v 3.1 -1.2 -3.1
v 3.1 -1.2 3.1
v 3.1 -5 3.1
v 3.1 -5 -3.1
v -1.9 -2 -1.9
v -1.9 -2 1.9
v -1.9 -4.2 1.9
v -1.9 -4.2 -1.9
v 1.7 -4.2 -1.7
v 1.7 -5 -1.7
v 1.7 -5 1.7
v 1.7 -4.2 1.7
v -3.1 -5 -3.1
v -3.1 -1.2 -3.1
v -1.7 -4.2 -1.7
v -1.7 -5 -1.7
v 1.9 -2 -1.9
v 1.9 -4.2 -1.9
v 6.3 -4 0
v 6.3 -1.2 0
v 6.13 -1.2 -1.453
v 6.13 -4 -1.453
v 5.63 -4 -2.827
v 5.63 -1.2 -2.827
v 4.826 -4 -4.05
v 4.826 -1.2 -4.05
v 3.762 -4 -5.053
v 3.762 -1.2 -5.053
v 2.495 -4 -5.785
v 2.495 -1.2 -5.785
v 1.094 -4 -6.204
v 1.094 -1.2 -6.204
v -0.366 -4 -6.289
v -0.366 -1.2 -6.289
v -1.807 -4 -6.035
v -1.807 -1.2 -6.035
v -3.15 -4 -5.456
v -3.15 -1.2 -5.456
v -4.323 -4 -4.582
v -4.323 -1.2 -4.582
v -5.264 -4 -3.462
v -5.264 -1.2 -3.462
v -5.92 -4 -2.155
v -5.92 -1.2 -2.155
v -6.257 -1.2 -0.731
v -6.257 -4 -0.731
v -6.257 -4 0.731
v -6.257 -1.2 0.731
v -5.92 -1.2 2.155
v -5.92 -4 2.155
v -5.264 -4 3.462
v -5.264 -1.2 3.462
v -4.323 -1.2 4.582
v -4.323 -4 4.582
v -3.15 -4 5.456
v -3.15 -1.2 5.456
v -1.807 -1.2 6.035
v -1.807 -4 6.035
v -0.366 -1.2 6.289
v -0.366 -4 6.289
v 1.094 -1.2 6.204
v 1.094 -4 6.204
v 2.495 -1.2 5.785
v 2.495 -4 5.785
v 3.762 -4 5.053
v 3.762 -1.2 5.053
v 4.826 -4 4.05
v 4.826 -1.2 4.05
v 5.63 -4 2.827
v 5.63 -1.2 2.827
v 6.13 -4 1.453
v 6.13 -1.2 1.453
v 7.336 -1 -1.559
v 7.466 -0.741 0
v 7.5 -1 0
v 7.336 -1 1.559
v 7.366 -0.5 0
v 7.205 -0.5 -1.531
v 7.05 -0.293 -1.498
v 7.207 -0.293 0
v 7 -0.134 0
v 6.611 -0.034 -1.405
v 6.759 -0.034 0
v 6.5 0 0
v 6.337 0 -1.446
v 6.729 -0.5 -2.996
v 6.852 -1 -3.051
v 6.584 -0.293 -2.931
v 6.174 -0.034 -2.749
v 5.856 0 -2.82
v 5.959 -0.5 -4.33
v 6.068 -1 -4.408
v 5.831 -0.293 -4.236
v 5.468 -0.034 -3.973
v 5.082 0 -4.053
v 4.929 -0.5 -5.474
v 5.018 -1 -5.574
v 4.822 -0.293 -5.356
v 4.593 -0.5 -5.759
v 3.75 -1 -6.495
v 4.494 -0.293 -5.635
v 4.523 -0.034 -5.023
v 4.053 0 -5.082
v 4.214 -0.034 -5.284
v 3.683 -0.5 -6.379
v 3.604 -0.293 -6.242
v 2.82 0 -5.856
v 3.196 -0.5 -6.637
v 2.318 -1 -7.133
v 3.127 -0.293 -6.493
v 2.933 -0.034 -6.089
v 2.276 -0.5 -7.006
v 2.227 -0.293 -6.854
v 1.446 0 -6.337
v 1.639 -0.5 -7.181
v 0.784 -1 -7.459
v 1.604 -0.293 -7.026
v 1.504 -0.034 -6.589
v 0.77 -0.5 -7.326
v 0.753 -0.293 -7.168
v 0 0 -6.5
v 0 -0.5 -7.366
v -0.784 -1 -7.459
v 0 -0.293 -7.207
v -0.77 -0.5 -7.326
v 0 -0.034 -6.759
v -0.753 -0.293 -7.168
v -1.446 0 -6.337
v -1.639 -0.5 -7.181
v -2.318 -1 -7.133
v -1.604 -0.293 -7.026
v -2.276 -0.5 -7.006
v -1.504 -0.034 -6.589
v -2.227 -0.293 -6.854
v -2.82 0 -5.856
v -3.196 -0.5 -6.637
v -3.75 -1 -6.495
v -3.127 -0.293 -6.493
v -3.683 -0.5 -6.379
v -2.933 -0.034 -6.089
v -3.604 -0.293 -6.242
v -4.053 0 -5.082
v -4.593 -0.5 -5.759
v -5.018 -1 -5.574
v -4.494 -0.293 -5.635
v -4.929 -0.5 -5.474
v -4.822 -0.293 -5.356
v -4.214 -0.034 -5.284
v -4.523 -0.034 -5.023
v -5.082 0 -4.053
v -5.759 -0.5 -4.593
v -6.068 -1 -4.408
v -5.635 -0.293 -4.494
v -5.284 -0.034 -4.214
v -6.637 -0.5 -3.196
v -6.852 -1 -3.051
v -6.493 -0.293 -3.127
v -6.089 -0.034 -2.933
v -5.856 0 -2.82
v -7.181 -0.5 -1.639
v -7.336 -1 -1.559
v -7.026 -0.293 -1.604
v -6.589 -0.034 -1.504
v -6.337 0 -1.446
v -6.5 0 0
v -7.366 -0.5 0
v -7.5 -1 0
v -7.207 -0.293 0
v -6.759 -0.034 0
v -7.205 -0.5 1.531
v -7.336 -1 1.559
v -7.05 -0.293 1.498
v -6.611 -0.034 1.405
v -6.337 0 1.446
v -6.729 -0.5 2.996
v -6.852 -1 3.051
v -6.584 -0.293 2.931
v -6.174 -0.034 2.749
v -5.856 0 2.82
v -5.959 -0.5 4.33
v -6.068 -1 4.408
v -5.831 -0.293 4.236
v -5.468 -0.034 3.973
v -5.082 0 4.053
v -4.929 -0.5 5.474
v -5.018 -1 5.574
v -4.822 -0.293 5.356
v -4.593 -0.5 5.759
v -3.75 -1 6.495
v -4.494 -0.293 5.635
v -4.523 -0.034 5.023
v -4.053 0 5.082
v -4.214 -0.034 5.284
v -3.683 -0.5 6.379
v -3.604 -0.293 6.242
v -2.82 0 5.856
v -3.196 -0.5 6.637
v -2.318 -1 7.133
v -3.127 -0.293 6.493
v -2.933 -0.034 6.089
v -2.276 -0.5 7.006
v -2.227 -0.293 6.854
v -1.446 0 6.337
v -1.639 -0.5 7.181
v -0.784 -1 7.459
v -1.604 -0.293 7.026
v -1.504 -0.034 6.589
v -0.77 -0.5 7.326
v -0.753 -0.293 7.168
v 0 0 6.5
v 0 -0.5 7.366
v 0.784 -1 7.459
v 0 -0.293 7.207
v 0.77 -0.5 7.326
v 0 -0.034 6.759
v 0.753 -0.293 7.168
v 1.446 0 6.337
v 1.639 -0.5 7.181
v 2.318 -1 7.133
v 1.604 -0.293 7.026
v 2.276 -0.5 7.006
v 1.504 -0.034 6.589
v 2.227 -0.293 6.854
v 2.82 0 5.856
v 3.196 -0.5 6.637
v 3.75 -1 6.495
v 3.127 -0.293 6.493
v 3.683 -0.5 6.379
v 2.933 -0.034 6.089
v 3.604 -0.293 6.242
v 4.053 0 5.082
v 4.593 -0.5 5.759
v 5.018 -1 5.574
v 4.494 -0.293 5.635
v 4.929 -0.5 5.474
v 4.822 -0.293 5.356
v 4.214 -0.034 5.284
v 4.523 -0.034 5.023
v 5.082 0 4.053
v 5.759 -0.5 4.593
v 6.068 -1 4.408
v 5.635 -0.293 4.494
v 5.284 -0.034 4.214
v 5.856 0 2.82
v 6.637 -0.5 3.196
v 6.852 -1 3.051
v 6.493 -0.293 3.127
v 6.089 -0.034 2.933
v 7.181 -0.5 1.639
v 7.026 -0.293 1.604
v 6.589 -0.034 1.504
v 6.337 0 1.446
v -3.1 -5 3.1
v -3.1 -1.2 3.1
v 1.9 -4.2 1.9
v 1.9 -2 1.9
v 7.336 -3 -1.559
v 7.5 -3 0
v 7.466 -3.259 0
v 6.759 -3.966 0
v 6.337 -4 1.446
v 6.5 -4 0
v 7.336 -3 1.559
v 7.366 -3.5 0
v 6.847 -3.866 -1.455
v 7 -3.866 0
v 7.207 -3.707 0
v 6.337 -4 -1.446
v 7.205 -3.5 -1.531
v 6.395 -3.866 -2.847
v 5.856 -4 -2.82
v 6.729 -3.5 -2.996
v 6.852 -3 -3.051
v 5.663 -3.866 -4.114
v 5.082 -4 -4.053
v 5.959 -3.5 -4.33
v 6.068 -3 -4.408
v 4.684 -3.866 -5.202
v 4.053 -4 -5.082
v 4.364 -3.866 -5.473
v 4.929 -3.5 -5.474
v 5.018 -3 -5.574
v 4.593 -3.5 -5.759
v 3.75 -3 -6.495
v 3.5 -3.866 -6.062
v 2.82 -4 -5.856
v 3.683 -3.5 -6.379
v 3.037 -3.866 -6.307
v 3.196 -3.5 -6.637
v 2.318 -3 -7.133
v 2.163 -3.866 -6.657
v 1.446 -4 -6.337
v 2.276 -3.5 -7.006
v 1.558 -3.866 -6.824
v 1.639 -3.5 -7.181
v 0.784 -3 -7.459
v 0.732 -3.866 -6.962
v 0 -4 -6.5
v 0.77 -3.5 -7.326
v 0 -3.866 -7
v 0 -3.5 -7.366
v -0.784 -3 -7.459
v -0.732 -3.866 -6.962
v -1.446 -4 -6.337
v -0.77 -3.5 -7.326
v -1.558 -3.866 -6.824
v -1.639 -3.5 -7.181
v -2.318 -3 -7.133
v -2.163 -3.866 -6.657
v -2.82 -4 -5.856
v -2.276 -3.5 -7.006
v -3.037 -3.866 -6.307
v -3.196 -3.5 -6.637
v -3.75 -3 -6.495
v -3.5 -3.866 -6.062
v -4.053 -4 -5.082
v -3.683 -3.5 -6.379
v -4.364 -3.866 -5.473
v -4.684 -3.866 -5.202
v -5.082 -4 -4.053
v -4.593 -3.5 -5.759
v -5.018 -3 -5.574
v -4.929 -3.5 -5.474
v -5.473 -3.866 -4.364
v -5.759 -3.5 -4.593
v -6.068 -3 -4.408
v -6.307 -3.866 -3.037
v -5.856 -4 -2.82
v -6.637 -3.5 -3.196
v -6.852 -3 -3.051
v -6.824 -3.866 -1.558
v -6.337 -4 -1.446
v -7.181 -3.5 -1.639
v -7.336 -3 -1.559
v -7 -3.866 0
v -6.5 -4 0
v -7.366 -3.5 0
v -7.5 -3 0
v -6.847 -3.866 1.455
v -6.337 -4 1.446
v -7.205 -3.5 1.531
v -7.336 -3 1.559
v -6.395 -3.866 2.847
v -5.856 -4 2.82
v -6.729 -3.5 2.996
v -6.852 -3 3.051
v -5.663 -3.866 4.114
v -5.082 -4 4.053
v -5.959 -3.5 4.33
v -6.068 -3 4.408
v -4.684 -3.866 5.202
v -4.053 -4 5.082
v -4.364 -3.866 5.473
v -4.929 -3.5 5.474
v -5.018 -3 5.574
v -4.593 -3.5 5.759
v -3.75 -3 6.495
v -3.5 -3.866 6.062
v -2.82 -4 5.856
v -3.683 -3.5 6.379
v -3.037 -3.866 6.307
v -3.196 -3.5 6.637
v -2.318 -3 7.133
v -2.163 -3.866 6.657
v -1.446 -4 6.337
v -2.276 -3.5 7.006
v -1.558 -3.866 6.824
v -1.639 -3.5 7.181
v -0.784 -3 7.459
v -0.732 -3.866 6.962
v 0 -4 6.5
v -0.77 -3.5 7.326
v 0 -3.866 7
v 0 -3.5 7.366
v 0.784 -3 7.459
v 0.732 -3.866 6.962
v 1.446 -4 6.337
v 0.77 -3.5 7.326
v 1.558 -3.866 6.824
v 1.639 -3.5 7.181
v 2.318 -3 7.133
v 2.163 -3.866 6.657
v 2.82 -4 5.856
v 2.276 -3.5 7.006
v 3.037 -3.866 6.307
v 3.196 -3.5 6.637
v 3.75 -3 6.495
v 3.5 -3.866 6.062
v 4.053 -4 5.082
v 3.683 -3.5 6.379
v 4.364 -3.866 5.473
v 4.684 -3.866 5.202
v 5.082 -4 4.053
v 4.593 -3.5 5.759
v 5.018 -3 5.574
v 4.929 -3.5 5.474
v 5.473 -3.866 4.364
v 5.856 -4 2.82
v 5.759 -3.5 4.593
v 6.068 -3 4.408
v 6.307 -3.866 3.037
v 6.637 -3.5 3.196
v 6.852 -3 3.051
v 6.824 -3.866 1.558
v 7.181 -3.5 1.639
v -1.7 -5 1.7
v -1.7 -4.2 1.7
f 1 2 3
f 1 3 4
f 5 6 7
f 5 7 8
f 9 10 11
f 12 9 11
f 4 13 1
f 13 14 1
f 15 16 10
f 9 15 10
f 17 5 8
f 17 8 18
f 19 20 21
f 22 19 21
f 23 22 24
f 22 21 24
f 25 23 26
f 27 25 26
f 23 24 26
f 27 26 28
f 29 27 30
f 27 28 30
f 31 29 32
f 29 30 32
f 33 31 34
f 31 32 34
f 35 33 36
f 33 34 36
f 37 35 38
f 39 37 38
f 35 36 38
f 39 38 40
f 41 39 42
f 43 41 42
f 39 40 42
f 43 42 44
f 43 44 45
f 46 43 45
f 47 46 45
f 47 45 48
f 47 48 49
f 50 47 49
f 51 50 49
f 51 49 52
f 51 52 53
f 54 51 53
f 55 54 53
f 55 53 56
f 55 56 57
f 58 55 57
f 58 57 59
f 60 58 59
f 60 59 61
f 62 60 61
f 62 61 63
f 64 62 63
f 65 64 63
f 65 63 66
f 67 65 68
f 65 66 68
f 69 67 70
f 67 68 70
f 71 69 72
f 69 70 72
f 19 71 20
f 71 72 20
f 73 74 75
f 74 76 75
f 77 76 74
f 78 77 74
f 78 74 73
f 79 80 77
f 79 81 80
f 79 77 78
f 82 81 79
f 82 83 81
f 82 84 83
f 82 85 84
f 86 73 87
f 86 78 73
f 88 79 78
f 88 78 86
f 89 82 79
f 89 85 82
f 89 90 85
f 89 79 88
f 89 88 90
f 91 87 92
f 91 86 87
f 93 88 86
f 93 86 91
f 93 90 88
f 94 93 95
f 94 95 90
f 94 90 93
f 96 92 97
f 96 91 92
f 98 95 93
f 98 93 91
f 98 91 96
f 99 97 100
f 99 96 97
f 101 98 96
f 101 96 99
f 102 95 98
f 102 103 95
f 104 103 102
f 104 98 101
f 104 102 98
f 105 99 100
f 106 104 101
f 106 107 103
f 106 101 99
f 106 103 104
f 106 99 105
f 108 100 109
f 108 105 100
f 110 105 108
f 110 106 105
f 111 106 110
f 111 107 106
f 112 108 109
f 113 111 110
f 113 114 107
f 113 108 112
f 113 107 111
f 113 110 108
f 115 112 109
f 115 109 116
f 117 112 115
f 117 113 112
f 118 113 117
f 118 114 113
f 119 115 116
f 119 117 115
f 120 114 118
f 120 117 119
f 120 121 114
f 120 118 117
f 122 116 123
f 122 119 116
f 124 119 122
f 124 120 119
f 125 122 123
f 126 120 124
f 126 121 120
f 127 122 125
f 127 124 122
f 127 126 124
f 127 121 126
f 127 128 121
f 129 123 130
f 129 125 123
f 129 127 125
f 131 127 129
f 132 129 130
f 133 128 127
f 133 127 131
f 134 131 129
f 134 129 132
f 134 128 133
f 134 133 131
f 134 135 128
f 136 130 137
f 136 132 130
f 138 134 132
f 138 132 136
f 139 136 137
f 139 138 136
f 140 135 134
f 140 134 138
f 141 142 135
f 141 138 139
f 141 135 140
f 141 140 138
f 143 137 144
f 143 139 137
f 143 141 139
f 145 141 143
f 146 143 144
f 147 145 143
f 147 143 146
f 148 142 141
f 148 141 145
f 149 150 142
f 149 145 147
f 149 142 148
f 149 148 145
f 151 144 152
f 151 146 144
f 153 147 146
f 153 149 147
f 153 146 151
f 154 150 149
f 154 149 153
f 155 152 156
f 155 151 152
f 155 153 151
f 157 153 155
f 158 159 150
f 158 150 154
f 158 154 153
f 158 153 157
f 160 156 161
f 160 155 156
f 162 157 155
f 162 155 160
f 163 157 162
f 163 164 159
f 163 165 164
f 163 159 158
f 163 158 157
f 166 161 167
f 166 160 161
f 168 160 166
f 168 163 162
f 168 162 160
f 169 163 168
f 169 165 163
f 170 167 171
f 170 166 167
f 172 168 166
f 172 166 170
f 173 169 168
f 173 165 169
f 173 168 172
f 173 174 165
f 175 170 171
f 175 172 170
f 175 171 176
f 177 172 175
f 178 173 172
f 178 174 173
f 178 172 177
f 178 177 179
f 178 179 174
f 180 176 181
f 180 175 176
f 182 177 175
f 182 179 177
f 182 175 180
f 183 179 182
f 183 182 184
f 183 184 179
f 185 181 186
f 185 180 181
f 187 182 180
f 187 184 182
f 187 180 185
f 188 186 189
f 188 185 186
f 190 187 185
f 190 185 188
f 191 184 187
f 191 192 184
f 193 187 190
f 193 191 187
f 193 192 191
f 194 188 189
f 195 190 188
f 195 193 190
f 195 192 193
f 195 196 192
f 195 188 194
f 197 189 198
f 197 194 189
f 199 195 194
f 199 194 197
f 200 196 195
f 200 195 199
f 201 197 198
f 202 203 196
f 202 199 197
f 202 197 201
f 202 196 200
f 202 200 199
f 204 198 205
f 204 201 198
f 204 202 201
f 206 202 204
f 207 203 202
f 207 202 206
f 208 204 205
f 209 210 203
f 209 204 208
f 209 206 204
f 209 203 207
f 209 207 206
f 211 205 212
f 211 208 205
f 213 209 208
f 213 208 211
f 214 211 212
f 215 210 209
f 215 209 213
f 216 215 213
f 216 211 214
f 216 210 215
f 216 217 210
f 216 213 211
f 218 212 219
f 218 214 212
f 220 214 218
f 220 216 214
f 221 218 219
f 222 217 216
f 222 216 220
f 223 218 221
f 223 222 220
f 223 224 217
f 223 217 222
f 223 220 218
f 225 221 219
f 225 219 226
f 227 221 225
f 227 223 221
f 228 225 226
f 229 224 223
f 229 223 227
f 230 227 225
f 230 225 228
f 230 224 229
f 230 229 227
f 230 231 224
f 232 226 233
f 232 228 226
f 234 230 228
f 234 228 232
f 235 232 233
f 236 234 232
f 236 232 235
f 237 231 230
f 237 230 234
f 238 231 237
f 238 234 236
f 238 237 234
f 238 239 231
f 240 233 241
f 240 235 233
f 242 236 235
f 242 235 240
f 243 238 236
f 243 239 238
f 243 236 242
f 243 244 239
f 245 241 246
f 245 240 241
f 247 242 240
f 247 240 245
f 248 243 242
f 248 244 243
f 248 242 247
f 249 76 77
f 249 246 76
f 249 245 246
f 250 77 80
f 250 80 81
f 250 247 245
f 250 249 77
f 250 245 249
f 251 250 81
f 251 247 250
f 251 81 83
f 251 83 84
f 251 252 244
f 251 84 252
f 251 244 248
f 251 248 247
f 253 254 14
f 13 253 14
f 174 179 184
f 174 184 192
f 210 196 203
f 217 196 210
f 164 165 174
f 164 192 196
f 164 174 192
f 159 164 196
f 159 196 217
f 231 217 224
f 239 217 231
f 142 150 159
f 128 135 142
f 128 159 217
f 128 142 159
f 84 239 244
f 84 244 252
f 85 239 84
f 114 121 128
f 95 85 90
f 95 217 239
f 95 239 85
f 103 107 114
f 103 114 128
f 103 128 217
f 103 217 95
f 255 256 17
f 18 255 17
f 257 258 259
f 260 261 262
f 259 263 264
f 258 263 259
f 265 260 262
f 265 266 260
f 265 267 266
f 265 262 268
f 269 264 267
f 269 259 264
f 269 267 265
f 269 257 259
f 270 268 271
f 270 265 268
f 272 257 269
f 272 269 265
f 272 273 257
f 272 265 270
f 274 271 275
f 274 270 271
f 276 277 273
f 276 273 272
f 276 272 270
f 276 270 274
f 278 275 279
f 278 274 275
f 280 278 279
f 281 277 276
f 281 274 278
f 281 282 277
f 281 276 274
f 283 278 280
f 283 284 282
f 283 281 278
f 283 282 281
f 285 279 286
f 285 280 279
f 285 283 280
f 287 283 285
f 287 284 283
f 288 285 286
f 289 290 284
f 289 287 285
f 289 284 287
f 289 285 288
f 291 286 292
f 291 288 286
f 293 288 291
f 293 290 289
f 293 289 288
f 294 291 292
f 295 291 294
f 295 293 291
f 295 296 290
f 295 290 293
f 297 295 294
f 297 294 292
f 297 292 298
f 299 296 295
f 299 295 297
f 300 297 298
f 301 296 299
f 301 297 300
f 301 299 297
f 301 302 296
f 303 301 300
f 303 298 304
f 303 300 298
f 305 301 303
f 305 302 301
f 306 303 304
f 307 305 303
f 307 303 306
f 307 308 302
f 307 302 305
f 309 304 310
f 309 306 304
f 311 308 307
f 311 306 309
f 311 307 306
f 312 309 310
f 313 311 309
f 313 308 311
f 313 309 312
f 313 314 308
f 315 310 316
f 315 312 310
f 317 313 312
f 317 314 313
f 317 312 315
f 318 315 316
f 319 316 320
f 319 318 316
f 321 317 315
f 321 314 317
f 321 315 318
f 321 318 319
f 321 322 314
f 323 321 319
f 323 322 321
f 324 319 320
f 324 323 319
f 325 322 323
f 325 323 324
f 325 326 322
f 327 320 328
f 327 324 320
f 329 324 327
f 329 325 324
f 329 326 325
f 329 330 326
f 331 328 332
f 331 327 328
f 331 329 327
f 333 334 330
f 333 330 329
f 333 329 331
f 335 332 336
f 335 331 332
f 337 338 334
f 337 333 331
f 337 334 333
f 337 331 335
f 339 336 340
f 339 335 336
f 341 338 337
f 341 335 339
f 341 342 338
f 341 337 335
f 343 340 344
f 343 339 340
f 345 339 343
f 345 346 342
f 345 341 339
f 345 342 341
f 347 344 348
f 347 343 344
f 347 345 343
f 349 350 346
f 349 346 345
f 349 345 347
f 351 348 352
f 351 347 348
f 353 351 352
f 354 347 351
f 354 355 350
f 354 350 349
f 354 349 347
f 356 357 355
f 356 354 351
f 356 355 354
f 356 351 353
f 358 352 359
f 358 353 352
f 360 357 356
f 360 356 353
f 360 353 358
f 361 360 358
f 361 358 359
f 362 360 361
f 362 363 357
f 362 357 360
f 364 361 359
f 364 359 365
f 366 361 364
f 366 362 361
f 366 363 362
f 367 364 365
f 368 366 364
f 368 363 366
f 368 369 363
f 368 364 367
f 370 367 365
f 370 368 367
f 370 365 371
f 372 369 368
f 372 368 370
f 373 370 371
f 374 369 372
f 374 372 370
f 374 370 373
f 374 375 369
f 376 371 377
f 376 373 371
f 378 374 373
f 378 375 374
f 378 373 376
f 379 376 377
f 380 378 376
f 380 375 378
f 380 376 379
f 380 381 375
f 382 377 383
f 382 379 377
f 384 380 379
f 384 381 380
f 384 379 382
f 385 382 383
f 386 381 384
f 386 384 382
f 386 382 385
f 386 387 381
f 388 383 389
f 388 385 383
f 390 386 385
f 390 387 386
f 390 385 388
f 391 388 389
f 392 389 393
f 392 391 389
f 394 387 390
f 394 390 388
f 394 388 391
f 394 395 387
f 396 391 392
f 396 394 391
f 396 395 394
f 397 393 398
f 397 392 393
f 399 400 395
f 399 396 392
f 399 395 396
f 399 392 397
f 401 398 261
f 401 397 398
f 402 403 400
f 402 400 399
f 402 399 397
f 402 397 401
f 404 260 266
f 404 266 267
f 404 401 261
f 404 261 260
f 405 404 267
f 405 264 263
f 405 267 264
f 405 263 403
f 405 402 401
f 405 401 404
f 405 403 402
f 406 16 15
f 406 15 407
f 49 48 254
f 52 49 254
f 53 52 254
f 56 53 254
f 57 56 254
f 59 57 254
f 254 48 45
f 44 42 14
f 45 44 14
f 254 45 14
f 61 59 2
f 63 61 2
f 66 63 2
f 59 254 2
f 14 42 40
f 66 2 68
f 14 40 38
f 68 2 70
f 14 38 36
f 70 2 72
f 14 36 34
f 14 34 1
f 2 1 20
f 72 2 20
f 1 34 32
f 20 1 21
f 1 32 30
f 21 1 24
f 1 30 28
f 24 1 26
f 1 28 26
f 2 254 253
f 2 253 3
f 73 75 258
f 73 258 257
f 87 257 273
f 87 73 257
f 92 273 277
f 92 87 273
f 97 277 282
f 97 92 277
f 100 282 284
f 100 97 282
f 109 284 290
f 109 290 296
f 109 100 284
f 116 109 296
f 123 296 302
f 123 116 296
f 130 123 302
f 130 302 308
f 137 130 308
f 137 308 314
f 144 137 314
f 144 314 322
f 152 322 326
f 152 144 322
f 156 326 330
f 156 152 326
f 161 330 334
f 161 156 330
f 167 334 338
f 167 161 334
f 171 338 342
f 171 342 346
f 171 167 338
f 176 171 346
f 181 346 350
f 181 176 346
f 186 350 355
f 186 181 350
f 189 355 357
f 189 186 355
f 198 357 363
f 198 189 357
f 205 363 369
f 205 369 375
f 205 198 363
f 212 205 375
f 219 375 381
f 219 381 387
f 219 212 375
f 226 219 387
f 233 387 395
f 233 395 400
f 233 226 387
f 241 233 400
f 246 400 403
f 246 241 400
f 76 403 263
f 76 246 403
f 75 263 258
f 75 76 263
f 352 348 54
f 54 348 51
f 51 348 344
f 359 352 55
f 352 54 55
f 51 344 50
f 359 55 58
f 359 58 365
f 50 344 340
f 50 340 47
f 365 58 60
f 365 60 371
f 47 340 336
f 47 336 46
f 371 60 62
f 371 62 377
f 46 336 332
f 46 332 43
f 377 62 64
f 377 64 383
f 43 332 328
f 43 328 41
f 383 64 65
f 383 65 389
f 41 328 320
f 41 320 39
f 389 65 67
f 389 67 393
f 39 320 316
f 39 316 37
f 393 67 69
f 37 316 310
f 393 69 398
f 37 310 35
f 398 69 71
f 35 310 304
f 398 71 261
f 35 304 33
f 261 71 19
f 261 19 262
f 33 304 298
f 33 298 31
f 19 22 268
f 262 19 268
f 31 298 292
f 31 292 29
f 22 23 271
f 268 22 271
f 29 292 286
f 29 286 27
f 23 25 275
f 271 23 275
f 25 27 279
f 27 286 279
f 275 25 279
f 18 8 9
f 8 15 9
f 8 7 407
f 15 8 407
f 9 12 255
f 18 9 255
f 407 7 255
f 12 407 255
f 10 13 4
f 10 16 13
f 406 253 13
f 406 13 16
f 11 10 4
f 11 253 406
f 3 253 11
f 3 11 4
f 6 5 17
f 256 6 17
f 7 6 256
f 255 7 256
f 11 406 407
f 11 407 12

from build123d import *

# Parameters (mm, degrees)
SKETCH_1_R      = 7.5
EXTRUDE_1_DEPTH = 1.2
SKETCH_1_3_R    = 7.5
SKETCH_1_3_R_2  = 6.3
EXTRUDE_2_DEPTH = 4
SKETCH_1_5_W    = 6.2
SKETCH_1_5_H    = 6.2
EXTRUDE_3_DEPTH = 2
EXTRUDE_START   = -2
SKETCH_1_6_W    = 6.2
SKETCH_1_6_H    = 6.2
SKETCH_1_6_W_2  = 3.8
SKETCH_1_6_H_2  = 3.8
EXTRUDE_4_DEPTH = 3
FILLET_1_R      = 1
SKETCH_2_W      = 3.8
SKETCH_2_H      = 3.8
SKETCH_2_W_2    = 3.4
SKETCH_2_H_2    = 3.4
EXTRUDE_5_DEPTH = 0.8


with BuildPart() as part:
    # Эскиз1 → Бобышка-Вытянуть1 (new body)
    with BuildSketch(Plane(origin=(0, 0, 0), x_dir=(1, 0, 0), z_dir=(0, 1, 0))):
        Circle(SKETCH_1_R)
    extrude(amount=-EXTRUDE_1_DEPTH)

    # Эскиз1<3> → Бобышка-Вытянуть2 (add)
    with BuildSketch(Plane(origin=(0, 0, 0), x_dir=(1, 0, 0), z_dir=(0, 1, 0))):
        Circle(SKETCH_1_3_R)
        Circle(SKETCH_1_3_R_2, mode=Mode.SUBTRACT)
    extrude(amount=-EXTRUDE_2_DEPTH)

    # Эскиз1<5> → Бобышка-Вытянуть3 (add)
    with BuildSketch(Plane(origin=(0, 0, 0), x_dir=(1, 0, 0), z_dir=(0, 1, 0))):
        Rectangle(SKETCH_1_5_W, SKETCH_1_5_H)
    extrude(amount=-EXTRUDE_3_DEPTH)

    # Эскиз1<6> → Бобышка-Вытянуть4 (add)
    with BuildSketch(Plane(origin=(0, 0, 0), x_dir=(1, 0, 0), z_dir=(0, 1, 0)).offset(EXTRUDE_START)):
        Rectangle(SKETCH_1_6_W, SKETCH_1_6_H)
        Rectangle(SKETCH_1_6_W_2, SKETCH_1_6_H_2, mode=Mode.SUBTRACT)
    extrude(amount=-EXTRUDE_4_DEPTH)

    # Скругление1
    fillet_1_edges = [part.edges().sort_by_distance(p)[0] for p in [
        (-7.5, 0, 0),
        (-7.5, -4, 0),
    ]]
    fillet(fillet_1_edges, radius=FILLET_1_R)

    # Эскиз2 → Бобышка-Вытянуть5 (add)
    with BuildSketch(Plane.XZ.offset(5)):
        Rectangle(SKETCH_2_W, SKETCH_2_H)
        Rectangle(SKETCH_2_W_2, SKETCH_2_H_2, mode=Mode.SUBTRACT)
    extrude(amount=-EXTRUDE_5_DEPTH)


solid = part.part
